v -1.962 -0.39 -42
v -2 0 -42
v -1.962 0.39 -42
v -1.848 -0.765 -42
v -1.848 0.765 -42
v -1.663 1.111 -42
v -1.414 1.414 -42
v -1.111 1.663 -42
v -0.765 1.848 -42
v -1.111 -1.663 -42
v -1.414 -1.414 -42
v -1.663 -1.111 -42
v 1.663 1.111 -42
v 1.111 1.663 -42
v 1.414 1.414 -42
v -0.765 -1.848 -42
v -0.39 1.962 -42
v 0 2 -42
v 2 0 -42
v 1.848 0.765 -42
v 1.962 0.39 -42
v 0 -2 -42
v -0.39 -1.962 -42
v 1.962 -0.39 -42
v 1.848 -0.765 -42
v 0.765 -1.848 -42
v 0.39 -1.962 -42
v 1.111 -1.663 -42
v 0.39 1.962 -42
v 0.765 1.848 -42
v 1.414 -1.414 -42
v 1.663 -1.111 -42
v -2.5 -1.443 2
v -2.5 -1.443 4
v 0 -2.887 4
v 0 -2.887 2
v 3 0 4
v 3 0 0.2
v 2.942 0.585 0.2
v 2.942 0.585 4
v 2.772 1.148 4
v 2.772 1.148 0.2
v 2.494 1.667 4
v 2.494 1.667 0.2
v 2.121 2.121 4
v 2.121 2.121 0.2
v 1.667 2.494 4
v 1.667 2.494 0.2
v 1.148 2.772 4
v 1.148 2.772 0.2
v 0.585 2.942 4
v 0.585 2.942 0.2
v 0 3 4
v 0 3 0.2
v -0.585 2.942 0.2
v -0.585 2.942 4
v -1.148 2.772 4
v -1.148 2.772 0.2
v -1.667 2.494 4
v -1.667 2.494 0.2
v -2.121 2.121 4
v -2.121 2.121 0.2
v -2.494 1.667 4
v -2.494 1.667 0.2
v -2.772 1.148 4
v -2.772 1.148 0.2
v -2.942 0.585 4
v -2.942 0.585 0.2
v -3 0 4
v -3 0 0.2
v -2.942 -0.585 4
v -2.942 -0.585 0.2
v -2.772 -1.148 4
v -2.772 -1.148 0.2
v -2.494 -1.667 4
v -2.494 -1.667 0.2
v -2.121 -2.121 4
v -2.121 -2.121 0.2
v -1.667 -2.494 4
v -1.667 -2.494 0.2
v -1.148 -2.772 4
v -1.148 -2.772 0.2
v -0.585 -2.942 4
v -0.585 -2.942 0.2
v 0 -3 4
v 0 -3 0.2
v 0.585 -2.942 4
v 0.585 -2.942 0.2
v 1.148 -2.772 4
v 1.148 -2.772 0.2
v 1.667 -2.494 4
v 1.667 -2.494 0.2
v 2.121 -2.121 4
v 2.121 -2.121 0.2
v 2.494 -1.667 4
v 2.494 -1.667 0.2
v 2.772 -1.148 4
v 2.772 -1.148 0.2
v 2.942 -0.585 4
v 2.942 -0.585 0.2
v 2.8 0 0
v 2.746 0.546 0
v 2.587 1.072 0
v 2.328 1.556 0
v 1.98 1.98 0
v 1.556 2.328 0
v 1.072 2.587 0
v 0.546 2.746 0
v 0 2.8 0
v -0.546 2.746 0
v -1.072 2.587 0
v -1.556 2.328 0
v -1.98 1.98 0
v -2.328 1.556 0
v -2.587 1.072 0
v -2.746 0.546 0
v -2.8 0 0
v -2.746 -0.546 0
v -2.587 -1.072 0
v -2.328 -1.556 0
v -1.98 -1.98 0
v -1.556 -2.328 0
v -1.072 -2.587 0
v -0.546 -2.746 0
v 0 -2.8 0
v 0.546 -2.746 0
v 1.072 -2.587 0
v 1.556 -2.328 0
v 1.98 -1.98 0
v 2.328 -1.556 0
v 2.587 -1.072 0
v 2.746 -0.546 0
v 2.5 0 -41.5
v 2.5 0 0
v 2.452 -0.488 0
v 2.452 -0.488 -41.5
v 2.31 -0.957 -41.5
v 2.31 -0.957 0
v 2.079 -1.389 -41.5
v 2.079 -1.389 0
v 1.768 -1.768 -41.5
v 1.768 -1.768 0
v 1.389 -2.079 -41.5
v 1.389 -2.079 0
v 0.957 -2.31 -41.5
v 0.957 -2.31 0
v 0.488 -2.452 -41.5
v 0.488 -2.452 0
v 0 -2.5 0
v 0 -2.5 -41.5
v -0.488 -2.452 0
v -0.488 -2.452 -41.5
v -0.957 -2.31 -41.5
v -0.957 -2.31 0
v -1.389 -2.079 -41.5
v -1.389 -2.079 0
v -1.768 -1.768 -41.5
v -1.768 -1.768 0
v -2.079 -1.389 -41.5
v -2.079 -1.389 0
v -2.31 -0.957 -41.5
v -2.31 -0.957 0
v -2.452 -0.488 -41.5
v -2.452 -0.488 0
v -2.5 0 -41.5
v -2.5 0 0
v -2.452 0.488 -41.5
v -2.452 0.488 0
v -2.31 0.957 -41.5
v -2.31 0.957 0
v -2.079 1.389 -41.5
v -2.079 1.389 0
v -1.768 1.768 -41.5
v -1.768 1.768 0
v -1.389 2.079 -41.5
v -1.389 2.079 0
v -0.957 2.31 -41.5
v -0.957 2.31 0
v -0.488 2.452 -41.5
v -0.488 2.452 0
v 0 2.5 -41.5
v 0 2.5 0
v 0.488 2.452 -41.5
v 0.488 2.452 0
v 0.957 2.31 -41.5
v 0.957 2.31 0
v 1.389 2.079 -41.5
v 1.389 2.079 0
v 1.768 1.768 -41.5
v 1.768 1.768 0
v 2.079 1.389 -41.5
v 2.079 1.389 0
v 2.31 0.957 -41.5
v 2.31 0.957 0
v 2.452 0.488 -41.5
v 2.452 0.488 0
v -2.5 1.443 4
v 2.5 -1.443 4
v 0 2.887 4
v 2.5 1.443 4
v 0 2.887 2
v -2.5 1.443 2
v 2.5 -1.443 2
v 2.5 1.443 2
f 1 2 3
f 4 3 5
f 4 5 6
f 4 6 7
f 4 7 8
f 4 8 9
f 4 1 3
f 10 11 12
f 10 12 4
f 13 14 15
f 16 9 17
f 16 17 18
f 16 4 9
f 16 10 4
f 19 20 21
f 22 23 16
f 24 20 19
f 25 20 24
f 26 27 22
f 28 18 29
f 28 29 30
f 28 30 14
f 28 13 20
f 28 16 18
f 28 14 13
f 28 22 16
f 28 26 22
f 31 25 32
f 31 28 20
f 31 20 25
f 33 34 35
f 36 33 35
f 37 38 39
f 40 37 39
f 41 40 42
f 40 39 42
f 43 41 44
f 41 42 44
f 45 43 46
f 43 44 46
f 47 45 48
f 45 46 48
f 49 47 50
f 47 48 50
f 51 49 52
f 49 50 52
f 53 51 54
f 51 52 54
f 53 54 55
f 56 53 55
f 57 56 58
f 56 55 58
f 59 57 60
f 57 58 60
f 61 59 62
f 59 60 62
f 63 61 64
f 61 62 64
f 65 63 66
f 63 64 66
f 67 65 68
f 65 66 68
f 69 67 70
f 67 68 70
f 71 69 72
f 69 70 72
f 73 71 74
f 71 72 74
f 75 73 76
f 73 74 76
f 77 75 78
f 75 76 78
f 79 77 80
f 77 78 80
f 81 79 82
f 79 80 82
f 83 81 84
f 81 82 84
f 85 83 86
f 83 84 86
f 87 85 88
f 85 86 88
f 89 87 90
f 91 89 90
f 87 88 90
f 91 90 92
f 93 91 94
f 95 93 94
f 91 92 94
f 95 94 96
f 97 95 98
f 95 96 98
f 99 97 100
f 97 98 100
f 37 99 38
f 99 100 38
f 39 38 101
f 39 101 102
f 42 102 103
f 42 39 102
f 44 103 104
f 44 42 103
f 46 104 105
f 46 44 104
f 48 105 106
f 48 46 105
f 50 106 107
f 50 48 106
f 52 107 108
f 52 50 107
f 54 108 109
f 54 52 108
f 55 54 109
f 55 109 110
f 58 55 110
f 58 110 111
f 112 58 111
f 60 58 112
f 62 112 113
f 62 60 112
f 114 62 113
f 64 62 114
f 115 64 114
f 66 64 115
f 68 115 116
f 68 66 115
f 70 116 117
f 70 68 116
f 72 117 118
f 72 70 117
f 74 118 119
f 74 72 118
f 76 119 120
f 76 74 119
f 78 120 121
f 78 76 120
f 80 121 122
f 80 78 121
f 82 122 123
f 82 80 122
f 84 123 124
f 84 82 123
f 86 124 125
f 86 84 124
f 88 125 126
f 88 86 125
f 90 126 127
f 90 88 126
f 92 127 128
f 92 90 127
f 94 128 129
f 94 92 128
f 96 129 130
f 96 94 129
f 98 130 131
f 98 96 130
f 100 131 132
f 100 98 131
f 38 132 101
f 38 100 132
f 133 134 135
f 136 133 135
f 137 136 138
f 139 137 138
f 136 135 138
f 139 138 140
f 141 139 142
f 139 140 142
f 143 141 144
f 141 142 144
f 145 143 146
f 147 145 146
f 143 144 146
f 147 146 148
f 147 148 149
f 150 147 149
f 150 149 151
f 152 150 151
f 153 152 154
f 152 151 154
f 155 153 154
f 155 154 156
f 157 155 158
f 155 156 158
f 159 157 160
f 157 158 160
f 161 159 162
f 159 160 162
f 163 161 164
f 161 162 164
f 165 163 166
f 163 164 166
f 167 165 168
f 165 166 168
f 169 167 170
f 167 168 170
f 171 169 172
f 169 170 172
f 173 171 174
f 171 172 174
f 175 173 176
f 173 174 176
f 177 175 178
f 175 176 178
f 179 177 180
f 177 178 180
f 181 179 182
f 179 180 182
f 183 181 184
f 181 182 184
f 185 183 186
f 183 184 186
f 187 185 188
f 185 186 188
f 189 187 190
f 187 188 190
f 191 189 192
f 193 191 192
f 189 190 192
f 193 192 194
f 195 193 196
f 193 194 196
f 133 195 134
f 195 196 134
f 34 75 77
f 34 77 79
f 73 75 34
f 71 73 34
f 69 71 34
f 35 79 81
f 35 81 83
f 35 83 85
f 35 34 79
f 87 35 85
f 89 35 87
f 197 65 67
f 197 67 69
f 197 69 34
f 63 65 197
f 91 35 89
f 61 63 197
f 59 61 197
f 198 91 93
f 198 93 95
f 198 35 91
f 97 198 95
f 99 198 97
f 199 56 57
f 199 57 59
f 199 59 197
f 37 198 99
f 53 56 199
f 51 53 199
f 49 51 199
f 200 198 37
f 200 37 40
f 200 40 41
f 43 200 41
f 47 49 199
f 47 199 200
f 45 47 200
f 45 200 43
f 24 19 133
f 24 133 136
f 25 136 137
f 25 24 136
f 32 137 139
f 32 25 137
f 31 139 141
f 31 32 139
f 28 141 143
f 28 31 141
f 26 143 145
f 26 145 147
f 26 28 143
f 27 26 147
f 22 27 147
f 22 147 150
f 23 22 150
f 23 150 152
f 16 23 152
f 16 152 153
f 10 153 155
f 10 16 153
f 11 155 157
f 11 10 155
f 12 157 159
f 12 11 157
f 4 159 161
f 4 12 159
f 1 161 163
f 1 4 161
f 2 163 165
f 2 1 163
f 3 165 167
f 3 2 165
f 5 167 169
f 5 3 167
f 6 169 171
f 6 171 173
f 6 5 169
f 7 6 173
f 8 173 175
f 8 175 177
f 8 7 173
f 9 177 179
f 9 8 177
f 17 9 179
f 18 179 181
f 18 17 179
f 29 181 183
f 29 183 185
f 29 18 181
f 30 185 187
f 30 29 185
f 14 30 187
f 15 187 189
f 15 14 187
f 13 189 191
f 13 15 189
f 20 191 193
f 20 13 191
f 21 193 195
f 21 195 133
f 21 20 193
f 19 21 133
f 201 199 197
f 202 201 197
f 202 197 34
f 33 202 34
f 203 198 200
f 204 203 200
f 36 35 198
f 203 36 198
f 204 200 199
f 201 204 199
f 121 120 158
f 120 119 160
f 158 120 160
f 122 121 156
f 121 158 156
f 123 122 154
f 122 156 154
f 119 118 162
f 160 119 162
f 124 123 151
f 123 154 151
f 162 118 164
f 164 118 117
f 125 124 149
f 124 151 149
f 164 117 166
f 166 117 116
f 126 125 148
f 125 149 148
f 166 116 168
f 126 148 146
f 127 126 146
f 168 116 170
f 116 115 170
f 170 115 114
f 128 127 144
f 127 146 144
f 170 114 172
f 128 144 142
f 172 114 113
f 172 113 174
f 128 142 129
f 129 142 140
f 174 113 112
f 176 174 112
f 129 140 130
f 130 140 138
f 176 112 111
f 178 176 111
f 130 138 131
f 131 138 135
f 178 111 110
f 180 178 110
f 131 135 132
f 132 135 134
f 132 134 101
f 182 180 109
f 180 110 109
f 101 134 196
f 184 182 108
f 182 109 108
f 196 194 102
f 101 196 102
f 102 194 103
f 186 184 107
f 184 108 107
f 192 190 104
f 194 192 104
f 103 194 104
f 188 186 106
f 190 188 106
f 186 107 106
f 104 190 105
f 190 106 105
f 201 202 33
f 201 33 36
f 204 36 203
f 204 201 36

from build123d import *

# Parameters (mm, degrees)
F0_R     = 3
F1_DEPTH = 4
F3_DEPTH = 2
F4_R     = 2.5
F5_DEPTH = 42
F6_SIZE  = 0.5
F7_SIZE  = 0.2


with BuildPart() as f1:
    # F0 (on Top) → F1 (new body)
    with BuildSketch(Plane.XY):
        Circle(F0_R)
    extrude(amount=F1_DEPTH)

    # F2 (on face) → F3 (cut)
    with BuildSketch(Plane.XY.offset(4)):
        Polygon((2.5, -1.443376), (2.5, 1.443376), (0, 2.886751), (-2.5, 1.443376), (-2.5, -1.443376), (0, -2.886751), align=None)
    extrude(amount=-F3_DEPTH, mode=Mode.SUBTRACT)

    # F4 (on face) → F5 (join)
    with BuildSketch(Plane(origin=(0, 0, 0), x_dir=(1, 0, 0), z_dir=(0, 0, -1))):
        Circle(F4_R)
    extrude(amount=F5_DEPTH)

    # F6
    f6_edges = [f1.edges().sort_by_distance(p)[0] for p in [
        (-2.5, 0, -42),
    ]]
    chamfer(f6_edges, length=F6_SIZE)

    # F7
    f7_edges = [f1.edges().sort_by_distance(p)[0] for p in [
        (-3, 0, 0),
    ]]
    chamfer(f7_edges, length=F7_SIZE)


solid = f1.part
